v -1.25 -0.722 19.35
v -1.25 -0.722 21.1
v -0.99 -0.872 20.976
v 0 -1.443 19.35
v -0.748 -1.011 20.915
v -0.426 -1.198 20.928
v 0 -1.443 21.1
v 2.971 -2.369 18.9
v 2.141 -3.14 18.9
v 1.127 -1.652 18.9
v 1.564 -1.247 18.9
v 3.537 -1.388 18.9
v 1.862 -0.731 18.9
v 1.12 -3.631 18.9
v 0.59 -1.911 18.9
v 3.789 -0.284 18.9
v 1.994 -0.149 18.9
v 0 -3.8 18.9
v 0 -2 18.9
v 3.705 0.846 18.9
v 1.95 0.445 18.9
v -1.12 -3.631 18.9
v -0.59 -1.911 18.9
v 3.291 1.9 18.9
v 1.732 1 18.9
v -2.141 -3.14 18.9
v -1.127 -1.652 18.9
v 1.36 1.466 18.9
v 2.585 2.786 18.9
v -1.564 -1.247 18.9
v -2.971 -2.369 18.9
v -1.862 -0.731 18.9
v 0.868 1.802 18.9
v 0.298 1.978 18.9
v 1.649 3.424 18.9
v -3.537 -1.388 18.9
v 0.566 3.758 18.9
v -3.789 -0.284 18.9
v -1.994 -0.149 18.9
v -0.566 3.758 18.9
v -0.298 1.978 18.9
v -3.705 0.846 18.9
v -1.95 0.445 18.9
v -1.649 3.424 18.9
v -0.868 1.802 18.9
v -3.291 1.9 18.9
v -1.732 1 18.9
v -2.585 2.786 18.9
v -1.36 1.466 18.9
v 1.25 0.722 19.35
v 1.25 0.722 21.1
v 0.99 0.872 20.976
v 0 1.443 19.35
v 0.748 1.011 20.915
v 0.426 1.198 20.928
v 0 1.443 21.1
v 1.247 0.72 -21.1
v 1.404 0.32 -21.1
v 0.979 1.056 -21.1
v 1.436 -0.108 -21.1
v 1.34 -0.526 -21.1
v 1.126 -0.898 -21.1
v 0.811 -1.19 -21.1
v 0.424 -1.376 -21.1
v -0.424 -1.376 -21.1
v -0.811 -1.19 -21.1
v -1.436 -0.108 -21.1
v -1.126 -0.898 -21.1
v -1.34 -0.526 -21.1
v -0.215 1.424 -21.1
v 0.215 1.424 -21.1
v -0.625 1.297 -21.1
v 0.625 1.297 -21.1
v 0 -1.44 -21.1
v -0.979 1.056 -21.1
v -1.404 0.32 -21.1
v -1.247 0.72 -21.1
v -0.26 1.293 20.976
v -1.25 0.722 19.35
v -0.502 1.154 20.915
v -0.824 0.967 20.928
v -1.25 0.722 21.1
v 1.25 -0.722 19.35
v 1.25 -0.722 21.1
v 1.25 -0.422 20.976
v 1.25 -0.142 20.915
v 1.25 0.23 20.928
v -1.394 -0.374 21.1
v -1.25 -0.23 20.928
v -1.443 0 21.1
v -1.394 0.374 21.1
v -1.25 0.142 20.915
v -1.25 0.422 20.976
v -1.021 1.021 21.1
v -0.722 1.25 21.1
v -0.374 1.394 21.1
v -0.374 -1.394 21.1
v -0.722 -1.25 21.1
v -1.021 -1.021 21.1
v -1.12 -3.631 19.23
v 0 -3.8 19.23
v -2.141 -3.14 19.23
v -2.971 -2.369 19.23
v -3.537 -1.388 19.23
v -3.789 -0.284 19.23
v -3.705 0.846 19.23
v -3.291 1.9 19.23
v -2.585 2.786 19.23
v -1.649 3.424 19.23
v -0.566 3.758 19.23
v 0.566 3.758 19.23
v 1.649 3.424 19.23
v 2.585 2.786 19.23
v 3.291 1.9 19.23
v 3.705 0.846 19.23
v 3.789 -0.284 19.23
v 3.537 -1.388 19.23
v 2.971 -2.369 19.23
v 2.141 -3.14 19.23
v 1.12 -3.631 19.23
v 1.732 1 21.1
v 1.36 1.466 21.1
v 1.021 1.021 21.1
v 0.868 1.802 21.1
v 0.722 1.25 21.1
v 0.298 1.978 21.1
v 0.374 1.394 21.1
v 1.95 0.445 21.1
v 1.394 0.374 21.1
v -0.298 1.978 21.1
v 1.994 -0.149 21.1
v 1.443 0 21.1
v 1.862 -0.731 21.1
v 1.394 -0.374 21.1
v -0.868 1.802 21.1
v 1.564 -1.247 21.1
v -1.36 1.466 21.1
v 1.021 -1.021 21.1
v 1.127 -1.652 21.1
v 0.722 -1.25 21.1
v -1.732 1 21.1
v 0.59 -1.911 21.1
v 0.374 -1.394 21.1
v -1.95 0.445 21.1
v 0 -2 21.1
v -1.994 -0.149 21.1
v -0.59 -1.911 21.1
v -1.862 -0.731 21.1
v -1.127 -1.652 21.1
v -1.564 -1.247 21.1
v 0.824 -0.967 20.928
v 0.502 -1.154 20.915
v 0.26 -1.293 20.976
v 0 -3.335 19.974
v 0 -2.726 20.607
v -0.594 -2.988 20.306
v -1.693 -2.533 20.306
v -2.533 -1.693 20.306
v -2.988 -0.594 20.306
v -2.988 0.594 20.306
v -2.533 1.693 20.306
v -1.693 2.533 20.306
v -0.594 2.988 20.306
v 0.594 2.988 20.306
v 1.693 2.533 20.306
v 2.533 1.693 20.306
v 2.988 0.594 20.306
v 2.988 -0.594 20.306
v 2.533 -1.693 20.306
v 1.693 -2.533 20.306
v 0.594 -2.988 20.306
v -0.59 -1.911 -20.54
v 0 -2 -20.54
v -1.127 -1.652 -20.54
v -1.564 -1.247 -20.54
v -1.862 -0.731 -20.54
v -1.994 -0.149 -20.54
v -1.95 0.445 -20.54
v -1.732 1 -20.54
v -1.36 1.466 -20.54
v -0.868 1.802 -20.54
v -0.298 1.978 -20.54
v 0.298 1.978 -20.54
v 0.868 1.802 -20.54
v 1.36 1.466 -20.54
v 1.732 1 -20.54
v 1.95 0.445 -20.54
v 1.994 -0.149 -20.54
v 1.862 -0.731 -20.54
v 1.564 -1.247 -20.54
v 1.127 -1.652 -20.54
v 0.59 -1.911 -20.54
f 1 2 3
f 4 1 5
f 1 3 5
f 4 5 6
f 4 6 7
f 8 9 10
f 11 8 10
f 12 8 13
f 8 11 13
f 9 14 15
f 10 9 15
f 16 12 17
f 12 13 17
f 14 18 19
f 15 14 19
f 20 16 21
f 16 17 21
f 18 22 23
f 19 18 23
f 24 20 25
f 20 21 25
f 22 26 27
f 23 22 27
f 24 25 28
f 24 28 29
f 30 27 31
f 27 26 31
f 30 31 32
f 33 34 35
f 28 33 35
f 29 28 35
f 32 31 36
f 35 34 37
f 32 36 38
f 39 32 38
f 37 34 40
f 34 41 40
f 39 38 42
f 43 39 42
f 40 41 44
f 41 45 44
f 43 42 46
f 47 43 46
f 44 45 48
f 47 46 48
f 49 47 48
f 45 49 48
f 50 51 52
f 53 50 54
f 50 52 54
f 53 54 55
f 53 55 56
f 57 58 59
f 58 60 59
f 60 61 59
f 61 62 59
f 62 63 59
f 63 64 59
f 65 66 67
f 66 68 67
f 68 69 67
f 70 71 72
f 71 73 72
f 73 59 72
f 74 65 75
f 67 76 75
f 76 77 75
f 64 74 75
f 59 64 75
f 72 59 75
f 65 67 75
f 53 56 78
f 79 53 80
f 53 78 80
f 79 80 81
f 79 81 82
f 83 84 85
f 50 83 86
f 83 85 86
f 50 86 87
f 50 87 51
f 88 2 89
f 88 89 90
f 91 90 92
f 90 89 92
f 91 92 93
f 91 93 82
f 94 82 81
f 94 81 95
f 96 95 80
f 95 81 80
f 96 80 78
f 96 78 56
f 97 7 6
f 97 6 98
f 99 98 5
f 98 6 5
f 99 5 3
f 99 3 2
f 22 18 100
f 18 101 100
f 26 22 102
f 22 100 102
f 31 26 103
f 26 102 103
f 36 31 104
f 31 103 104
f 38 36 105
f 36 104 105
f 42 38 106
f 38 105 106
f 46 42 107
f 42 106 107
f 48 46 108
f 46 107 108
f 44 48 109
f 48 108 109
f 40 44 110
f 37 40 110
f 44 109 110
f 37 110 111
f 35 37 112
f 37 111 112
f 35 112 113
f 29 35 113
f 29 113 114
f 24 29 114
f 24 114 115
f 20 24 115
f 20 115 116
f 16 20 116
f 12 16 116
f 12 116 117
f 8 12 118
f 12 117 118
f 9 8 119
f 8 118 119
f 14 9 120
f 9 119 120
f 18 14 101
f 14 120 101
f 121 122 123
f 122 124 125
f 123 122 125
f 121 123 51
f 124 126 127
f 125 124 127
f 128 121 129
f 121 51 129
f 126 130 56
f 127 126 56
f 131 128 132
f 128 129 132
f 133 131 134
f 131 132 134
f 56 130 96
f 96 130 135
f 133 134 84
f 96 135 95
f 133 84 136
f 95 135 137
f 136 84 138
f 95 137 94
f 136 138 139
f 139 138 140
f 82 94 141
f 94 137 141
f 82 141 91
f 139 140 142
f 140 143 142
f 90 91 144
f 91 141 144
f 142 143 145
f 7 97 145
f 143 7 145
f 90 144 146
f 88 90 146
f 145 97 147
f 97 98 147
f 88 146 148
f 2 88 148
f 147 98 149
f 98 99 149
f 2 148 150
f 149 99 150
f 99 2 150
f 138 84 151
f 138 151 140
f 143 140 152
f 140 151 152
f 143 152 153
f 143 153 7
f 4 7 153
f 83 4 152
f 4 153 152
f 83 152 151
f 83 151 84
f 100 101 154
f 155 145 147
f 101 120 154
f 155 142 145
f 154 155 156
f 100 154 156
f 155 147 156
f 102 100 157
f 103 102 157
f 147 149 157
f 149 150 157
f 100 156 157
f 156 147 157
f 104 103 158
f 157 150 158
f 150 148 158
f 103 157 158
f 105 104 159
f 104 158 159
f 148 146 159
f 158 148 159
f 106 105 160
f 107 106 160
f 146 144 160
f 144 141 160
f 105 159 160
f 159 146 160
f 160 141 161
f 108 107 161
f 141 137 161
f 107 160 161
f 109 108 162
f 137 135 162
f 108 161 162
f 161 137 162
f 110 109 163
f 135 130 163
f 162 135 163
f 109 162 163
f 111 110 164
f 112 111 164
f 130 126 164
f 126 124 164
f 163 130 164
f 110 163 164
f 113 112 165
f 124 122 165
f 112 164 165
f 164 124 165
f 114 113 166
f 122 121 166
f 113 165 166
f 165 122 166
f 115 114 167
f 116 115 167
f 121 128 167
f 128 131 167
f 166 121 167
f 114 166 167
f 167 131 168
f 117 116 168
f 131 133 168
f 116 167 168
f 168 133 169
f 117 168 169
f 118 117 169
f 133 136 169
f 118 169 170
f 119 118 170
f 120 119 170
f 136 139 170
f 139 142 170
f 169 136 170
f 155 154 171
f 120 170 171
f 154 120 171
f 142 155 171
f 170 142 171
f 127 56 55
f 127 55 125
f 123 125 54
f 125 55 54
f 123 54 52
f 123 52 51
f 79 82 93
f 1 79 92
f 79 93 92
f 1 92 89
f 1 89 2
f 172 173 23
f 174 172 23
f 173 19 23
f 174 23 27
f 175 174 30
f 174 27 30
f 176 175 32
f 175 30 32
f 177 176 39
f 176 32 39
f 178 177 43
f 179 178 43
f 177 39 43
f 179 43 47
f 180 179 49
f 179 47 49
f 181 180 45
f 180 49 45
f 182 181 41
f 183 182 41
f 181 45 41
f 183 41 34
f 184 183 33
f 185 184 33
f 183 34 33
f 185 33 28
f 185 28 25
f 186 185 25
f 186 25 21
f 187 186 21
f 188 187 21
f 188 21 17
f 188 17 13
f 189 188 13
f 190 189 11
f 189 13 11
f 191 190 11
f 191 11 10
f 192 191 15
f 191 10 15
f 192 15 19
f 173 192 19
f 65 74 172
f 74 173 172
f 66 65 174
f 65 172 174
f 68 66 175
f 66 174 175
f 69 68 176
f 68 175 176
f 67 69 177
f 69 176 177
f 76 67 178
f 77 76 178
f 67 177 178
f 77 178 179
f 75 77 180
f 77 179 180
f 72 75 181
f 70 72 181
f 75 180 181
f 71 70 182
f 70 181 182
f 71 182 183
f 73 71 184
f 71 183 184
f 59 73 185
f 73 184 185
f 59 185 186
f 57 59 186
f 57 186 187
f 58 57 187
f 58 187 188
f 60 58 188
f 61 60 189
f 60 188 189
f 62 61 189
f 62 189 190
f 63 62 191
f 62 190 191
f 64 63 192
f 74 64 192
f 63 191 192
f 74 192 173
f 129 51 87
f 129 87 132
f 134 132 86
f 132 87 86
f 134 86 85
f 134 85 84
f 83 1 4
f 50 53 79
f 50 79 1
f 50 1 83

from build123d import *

# Parameters (mm, degrees)
CUT_EXTRUDE1_DEPTH = 1.75


with BuildPart() as part:
    # Sketch2 → Revolve1 (revolve)
    with BuildSketch(Plane(origin=(0, 0, 0), x_dir=(0, 0, -1), z_dir=(1, 0, 0)), mode=Mode.PRIVATE) as revolve1_sk:
        with BuildLine():
            Line((-21.1, 0), (21.1, 0))
            Line((21.1, 0), (21.1, 1.44))
            Line((21.1, 1.44), (20.54, 2))
            Line((20.54, 2), (-18.9, 2))
            Line((-18.9, 2), (-18.9, 3.8))
            Line((-18.9, 3.8), (-19.23, 3.8))
            ThreePointArc((-19.23, 3.8), (-20.306499853, 3.047002626), (-21.1, 2))
            Line((-21.1, 2), (-21.1, 0))
        make_face()
    revolve(revolve1_sk.sketch.rotate(Axis((0, 0, 21.1), (0, 0, -1)), 180), axis=Axis((0, 0, 21.1), (0, 0, -1)))

    # Sketch3 → Cut-Extrude1 (cut)
    with BuildSketch(Plane.XY.offset(21.1)):
        Polygon((0, 1.443375673), (-1.25, 0.721687836), (-1.25, -0.721687836), (0, -1.443375673), (1.25, -0.721687836), (1.25, 0.721687836), align=None)
    extrude(amount=-CUT_EXTRUDE1_DEPTH, mode=Mode.SUBTRACT)

    # Cut-Extrude2 cone 1 section (through the dimple's axis) → Cut-Extrude2 (revolve, cut)
    with BuildSketch(Plane(origin=(0, 0, 21.1), x_dir=(0, -1, 0), z_dir=(1, 0, 0))):
        Polygon((0, 0), (1.443375673, 0), (0, 1.443375673), align=None)
    revolve(axis=Axis((0, 0, 21.1), (0, 0, -1)), mode=Mode.SUBTRACT)


solid = part.part
